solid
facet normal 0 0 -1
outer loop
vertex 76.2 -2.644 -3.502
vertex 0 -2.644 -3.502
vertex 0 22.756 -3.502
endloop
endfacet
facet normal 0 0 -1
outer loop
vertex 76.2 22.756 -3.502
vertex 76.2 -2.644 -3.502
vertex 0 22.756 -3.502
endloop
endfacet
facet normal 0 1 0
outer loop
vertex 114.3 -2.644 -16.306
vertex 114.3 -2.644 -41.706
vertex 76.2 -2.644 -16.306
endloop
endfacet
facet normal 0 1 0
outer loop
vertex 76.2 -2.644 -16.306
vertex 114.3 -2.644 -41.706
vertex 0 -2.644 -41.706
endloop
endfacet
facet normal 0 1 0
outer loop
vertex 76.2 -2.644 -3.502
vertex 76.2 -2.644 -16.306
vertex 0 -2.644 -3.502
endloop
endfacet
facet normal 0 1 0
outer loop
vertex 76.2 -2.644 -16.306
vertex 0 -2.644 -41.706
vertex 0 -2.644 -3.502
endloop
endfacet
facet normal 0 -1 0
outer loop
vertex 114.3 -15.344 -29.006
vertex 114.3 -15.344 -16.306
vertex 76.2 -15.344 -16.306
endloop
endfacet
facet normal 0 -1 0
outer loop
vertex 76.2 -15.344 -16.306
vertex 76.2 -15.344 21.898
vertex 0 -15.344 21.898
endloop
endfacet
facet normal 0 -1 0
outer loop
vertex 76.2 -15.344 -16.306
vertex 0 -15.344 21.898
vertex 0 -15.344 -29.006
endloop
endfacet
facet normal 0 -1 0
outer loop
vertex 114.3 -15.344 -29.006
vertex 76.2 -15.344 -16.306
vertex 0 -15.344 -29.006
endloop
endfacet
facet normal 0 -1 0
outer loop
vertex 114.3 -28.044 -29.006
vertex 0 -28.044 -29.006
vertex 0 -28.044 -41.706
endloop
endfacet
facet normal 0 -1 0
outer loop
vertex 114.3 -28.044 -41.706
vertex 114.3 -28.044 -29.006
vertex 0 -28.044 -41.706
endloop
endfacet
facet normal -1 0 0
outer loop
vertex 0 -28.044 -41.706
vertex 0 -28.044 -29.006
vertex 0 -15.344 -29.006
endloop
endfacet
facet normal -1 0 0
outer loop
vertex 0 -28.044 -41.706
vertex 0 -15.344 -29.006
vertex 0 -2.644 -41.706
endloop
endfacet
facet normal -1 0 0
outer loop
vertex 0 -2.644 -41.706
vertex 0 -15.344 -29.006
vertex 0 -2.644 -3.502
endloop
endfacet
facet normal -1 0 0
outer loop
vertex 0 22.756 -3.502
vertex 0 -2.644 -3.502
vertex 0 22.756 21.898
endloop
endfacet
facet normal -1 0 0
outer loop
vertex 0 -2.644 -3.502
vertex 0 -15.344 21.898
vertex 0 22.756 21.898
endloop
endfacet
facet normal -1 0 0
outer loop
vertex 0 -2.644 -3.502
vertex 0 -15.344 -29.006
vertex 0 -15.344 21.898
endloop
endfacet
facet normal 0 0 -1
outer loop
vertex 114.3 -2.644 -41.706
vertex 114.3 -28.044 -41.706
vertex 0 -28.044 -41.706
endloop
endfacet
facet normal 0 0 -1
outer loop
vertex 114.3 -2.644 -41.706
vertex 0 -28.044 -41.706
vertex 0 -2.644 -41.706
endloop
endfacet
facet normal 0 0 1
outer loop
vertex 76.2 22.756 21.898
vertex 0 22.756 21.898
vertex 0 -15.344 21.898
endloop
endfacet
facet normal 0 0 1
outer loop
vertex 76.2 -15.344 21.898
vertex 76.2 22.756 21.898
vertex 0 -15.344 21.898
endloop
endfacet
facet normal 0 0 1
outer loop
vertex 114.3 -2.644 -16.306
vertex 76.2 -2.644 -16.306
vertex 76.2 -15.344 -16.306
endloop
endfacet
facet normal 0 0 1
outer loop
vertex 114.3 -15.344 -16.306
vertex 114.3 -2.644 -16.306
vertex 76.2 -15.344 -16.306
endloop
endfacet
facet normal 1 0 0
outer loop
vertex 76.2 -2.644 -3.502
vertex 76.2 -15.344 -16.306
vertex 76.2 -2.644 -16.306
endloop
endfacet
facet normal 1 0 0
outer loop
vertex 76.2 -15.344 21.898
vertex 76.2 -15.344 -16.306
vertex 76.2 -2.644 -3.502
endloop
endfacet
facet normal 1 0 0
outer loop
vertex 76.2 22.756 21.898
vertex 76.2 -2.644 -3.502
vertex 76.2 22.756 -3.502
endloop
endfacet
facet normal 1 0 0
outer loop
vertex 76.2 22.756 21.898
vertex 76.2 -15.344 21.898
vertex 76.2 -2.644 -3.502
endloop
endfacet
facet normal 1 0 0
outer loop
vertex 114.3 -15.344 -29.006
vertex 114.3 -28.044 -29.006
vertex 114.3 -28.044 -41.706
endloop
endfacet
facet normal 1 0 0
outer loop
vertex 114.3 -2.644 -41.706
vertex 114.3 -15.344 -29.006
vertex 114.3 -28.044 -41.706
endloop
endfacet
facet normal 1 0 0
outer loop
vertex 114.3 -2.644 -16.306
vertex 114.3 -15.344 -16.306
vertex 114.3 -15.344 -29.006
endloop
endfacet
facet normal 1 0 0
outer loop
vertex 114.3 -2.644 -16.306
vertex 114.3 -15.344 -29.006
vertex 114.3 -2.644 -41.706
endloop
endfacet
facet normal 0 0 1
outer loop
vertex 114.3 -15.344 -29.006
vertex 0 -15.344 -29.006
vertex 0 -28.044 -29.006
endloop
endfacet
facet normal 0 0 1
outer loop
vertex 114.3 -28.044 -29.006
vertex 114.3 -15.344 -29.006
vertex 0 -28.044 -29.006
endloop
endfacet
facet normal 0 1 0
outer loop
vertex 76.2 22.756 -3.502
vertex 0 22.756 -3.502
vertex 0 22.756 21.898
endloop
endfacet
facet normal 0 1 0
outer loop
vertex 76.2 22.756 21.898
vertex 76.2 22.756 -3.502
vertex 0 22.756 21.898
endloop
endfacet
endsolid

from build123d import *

# Parameters (mm, degrees)
F1_DEPTH = 76.2
F2_DEPTH = 46.736
F3_DEPTH = 114.3


with BuildPart() as f1:
    # F0 (on Right) → F1 (new body)
    with BuildSketch(Plane.YZ):
        Polygon((22.755747968, 21.8976219215), (-15.344252032, 21.8976219215), (-15.344252032, -16.3060310256), (-2.644252032, -16.3060310256), (-2.644252032, -3.5023780785), (22.755747968, -3.5023780785), align=None)
        Polygon((-15.344252032, -29.0060310256), (-28.044252032, -29.0060310256), (-28.044252032, -41.7060310256), (-2.644252032, -41.7060310256), (-2.644252032, -16.3060310256), (-15.344252032, -16.3060310256), align=None)
    extrude(amount=F1_DEPTH)

    # F2 (add): a face of the model
    f2_faces = [f1.faces().sort_by_distance(p)[0] for p in [
        (0, -2.6494304529, -4.812812026),
    ]]
    extrude(f2_faces, amount=-F2_DEPTH)

    # F0 (on Right) → F3 (join)
    with BuildSketch(Plane.YZ):
        Polygon((-15.344252032, -29.0060310256), (-28.044252032, -29.0060310256), (-28.044252032, -41.7060310256), (-2.644252032, -41.7060310256), (-2.644252032, -16.3060310256), (-15.344252032, -16.3060310256), align=None)
    extrude(amount=F3_DEPTH)


solid = f1.part
